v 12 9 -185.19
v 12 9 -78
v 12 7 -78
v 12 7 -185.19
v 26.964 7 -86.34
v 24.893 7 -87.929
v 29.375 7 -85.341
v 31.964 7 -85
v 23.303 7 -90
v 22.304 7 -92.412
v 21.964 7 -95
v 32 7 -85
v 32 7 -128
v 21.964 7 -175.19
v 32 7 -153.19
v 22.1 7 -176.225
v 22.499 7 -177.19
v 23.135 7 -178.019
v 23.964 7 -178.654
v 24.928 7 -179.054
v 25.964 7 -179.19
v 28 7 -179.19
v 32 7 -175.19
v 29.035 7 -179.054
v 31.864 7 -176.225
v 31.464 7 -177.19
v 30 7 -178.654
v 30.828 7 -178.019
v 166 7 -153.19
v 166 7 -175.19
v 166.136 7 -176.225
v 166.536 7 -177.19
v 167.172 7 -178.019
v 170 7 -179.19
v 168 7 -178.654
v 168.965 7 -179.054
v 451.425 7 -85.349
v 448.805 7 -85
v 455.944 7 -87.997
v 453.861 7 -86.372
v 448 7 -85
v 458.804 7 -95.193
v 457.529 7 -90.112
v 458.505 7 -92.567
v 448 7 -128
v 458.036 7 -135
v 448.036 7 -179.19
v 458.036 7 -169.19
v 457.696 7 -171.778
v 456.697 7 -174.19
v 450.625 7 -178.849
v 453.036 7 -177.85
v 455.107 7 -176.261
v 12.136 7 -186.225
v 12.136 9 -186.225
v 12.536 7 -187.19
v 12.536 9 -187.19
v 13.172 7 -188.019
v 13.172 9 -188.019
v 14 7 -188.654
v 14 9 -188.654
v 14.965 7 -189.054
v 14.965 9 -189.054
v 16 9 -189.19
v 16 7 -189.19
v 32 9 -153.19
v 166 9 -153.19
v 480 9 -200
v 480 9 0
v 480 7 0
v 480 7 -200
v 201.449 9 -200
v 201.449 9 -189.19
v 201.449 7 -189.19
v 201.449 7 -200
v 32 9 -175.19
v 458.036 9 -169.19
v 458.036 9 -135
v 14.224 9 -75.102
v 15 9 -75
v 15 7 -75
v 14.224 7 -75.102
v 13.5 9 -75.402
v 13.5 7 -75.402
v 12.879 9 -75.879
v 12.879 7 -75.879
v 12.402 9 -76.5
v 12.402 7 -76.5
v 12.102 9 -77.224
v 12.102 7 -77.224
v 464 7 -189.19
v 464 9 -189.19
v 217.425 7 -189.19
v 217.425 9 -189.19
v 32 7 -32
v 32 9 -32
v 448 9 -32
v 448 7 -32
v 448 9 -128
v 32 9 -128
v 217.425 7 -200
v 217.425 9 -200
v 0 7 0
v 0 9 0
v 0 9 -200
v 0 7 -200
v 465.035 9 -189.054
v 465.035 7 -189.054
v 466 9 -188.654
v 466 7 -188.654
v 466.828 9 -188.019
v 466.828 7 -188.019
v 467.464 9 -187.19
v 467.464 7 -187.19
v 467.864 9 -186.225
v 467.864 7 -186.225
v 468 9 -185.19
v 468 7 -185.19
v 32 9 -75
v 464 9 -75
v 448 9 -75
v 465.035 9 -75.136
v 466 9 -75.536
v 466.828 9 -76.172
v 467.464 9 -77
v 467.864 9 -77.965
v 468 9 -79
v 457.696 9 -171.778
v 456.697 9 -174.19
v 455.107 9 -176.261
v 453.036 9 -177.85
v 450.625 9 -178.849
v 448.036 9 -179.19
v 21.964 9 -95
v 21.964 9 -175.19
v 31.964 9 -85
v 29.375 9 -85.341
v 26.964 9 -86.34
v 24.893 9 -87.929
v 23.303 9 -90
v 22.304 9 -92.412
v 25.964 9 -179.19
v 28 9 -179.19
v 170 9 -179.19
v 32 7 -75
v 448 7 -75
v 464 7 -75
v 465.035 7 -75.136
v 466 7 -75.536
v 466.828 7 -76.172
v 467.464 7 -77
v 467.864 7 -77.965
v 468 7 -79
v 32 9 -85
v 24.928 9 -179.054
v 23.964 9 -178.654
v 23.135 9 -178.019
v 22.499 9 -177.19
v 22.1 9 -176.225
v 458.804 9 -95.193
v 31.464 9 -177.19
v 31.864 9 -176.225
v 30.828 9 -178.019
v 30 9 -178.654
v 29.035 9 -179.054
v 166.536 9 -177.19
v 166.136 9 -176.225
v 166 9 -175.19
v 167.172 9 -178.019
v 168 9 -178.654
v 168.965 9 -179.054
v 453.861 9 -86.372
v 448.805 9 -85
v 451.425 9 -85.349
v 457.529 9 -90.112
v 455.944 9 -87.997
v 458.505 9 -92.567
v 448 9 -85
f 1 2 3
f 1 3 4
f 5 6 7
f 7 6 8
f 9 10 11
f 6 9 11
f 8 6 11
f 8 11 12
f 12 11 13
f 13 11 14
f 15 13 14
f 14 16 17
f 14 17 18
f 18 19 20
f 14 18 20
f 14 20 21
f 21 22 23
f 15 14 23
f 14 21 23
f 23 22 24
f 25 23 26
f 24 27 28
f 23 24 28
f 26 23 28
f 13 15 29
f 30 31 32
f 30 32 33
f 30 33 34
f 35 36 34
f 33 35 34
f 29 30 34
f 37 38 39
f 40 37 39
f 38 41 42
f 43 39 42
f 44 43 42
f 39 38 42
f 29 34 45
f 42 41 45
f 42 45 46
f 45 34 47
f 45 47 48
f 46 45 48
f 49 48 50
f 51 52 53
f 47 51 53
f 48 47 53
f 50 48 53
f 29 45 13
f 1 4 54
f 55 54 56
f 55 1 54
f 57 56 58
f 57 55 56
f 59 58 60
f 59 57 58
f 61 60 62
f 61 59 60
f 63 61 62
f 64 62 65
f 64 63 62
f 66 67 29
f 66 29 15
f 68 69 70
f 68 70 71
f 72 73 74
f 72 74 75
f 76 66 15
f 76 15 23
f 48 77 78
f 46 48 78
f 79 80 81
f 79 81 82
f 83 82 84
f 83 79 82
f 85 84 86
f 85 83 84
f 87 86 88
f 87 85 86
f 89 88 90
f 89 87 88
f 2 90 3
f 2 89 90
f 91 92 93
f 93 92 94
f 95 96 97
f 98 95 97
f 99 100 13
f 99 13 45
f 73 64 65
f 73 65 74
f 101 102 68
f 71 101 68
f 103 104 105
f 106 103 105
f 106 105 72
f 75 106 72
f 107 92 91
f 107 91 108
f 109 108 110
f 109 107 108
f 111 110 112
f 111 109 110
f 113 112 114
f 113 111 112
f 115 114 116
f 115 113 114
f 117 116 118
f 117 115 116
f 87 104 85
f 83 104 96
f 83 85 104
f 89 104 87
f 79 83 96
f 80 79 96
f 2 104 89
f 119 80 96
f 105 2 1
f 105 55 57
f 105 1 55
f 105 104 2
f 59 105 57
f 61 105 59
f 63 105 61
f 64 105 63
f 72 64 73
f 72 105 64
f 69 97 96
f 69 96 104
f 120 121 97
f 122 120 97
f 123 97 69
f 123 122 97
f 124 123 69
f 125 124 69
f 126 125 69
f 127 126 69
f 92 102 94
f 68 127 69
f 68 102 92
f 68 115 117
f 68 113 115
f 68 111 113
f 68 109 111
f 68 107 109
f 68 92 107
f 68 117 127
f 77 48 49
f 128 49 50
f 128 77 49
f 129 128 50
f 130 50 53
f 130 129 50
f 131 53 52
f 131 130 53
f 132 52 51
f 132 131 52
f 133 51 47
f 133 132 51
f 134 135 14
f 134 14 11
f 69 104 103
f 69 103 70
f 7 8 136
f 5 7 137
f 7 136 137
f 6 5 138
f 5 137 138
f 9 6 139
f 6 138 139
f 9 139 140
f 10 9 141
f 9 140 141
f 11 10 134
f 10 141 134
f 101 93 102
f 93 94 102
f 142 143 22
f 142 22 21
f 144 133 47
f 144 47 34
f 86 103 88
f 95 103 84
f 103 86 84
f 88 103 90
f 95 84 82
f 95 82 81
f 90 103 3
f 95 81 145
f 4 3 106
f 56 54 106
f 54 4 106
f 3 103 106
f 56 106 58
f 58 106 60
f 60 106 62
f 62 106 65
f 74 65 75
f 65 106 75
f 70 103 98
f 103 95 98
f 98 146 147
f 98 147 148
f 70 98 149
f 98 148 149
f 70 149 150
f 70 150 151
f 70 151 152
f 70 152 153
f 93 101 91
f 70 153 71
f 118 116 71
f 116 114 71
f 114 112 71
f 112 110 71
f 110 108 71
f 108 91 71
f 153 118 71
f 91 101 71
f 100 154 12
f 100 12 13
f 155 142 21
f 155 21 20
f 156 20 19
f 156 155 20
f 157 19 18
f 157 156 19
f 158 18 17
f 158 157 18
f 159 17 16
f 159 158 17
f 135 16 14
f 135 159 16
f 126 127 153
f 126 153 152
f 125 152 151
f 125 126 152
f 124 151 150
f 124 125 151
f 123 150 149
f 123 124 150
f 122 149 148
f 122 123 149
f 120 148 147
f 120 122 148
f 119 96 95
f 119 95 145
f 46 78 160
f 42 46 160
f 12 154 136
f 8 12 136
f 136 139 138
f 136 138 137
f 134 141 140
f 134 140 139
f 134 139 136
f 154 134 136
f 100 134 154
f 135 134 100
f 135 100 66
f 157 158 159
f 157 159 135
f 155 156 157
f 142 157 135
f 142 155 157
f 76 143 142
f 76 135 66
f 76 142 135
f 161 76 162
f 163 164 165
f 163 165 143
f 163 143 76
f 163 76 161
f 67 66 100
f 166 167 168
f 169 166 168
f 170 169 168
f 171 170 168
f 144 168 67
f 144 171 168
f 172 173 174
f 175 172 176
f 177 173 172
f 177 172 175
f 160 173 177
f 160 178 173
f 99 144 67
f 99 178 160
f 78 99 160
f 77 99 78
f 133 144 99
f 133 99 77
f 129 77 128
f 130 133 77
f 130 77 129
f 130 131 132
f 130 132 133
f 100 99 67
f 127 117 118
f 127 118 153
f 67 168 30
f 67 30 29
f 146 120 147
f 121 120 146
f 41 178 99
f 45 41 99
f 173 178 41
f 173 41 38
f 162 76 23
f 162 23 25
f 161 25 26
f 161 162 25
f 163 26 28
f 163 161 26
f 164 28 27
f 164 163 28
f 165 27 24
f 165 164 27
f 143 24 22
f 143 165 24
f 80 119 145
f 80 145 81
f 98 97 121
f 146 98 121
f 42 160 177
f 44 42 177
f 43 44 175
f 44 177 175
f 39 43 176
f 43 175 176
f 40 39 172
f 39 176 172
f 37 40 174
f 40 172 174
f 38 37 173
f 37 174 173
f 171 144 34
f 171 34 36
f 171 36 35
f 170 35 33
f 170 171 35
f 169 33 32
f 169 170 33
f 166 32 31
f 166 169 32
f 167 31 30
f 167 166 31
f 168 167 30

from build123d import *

# Parameters (mm, degrees)
CROQUIS1_W              = 486.2
CROQUIS1_H              = 206.2
CROQUIS1_W_2            = 480
CROQUIS1_H_2            = 200
SALIENTE_EXTRUIR1_DEPTH = 12
CROQUIS3_W              = 486.2
CROQUIS3_H              = 206.2
CROQUIS3_W_2            = 480
CROQUIS3_H_2            = 200
CORTAR_EXTRUIR1_DEPTH   = 5
CORTAR_EXTRUIR3_DEPTH   = 8
CROQUIS4_W              = 20
CROQUIS4_H              = 6
CORTAR_EXTRUIR4_DEPTH   = 3
CORTAR_EXTRUIR5_DEPTH   = 2
CROQUIS7_W              = 721.947089947
CROQUIS7_H              = 359.419856831
CORTAR_EXTRUIR6_DEPTH   = 10
CROQUIS8_W              = 416
CROQUIS8_H              = 96
CORTAR_EXTRUIR7_DEPTH   = 10
CROQUIS9_W              = 531.904745737
CROQUIS9_H              = 246.353411826
CORTAR_EXTRUIR9_DEPTH   = 10
CROQUIS10_W             = 531.904745737
CROQUIS10_H             = 246.353411826
CORTAR_EXTRUIR10_DEPTH  = 10


with BuildPart() as part:
    # Croquis1 → Saliente-Extruir1 (new body)
    with BuildSketch(Plane(origin=(0, 0, 0), x_dir=(1, 0, 0), z_dir=(0, 1, 0))):
        with Locations((240, 100)):
            Rectangle(CROQUIS1_W, CROQUIS1_H)
        with Locations((240, 100)):
            Rectangle(CROQUIS1_W_2, CROQUIS1_H_2, mode=Mode.SUBTRACT)
        with Locations((240, 100)):
            Rectangle(CROQUIS1_W_2, CROQUIS1_H_2)
    extrude(amount=SALIENTE_EXTRUIR1_DEPTH)

    # Croquis3 → Cortar-Extruir1 (cut)
    with BuildSketch(Plane(origin=(0, 12, 0), x_dir=(1, 0, 0), z_dir=(0, 1, 0))):
        with Locations((240, 100)):
            Rectangle(CROQUIS3_W, CROQUIS3_H)
        with Locations((240, 100)):
            Rectangle(CROQUIS3_W_2, CROQUIS3_H_2, mode=Mode.SUBTRACT)
    extrude(amount=-CORTAR_EXTRUIR1_DEPTH, mode=Mode.SUBTRACT)

    # Croquis2 → Cortar-Extruir3 (cut)
    with BuildSketch(Plane(origin=(0, 12, 0), x_dir=(1, 0, 0), z_dir=(0, 1, 0))):
        with BuildLine():
            ThreePointArc((16, 189.1902066), (13.171572875, 188.018633725), (12, 185.1902066))
            Line((12, 185.1902066), (12, 78))
            ThreePointArc((12, 78), (12.878679656, 75.878679656), (15, 75))
            Line((15, 75), (32, 75))
            Line((32, 75), (32, 32))
            Line((32, 32), (448, 32))
            Line((448, 32), (448, 75))
            Line((448, 75), (464, 75))
            ThreePointArc((464, 75), (466.828427125, 76.171572875), (468, 79))
            Line((468, 79), (468, 185.1902066))
            ThreePointArc((468, 185.1902066), (466.828427125, 188.018633725), (464, 189.1902066))
            Line((464, 189.1902066), (217.424703227, 189.1902066))
            Line((217.424703227, 189.1902066), (217.424703227, 203.1))
            Line((217.424703227, 203.1), (201.44869327, 203.1))
            Line((201.44869327, 203.1), (201.44869327, 189.1902066))
            Line((201.44869327, 189.1902066), (16, 189.1902066))
        make_face()
        with BuildLine():
            Line((32, 85), (31.963588191, 85))
            ThreePointArc((31.963588191, 85), (24.892520379, 87.928932188), (21.963588191, 95))
            Line((21.963588191, 95), (21.963588191, 175.1902066))
            ThreePointArc((21.963588191, 175.1902066), (23.135161066, 178.018633725), (25.963588191, 179.1902066))
            Line((25.963588191, 179.1902066), (28, 179.1902066))
            ThreePointArc((28, 179.1902066), (30.828427125, 178.018633725), (32, 175.1902066))
            Line((32, 175.1902066), (32, 153.1902066))
            Line((32, 153.1902066), (166, 153.1902066))
            Line((166, 153.1902066), (166, 175.1902066))
            ThreePointArc((166, 175.1902066), (167.171572875, 178.018633725), (170, 179.1902066))
            Line((170, 179.1902066), (448.036411809, 179.1902066))
            ThreePointArc((448.036411809, 179.1902066), (455.107479621, 176.261274412), (458.036411809, 169.1902066))
            Line((458.036411809, 169.1902066), (458.036411809, 135.000000034))
            Line((458.036411809, 135.000000034), (458.803569043, 95.19268186))
            ThreePointArc((458.803569043, 95.19268186), (455.944291637, 87.997386866), (448.80542553, 85))
            Line((448.80542553, 85), (448, 85))
            Line((448, 85), (448, 128))
            Line((448, 128), (32, 128))
            Line((32, 128), (32, 85))
        make_face(mode=Mode.SUBTRACT)
    extrude(amount=-CORTAR_EXTRUIR3_DEPTH, mode=Mode.SUBTRACT)

    # Croquis4 → Cortar-Extruir4 (cut)
    with BuildSketch(Plane(origin=(0, 12, 0), x_dir=(1, 0, 0), z_dir=(0, 1, 0))):
        with BuildLine():
            Line((31.963588191, 85), (32, 128))
            Line((32, 128), (32, 134))
            Line((32, 134), (32, 147.1902066))
            Line((32, 147.1902066), (32, 153.1902066))
            Line((32, 153.1902066), (32, 175.1902066))
            ThreePointArc((32, 175.1902066), (30.828427125, 178.018633725), (28, 179.1902066))
            Line((28, 179.1902066), (25.963588191, 179.1902066))
            ThreePointArc((25.963588191, 179.1902066), (23.135161066, 178.018633725), (21.963588191, 175.1902066))
            Line((21.963588191, 175.1902066), (21.963588191, 95))
            ThreePointArc((21.963588191, 95), (24.892520379, 87.928932188), (31.963588191, 85))
        make_face()
        with Locations((42, 131)):
            Rectangle(CROQUIS4_W, CROQUIS4_H)
        with Locations((42, 150.1902066)):
            Rectangle(CROQUIS4_W, CROQUIS4_H)
        with BuildLine():
            ThreePointArc((12, 78), (12.878679656, 75.878679656), (15, 75))
            Line((15, 75), (32, 75))
            Line((32, 75), (32, 69))
            Line((32, 69), (6, 69))
            Line((6, 69), (6, 80))
            Line((6, 80), (6, 195.1902066))
            Line((6, 195.1902066), (16, 195.1902066))
            Line((16, 195.1902066), (32, 195.1902066))
            Line((32, 195.1902066), (32, 189.1902066))
            Line((32, 189.1902066), (16, 189.1902066))
            ThreePointArc((16, 189.1902066), (13.171572875, 188.018633725), (12, 185.1902066))
            Line((12, 185.1902066), (12, 80))
            Line((12, 80), (12, 78))
        make_face()
        with Locations((42, 192.1902066)):
            Rectangle(CROQUIS4_W, CROQUIS4_H)
        with Locations((42, 29)):
            Rectangle(CROQUIS4_W, CROQUIS4_H)
        with Locations((156, 192.1902066)):
            Rectangle(CROQUIS4_W, CROQUIS4_H)
        with Locations((156, 150.1902066)):
            Rectangle(CROQUIS4_W, CROQUIS4_H)
        with BuildLine():
            Line((166, 147.1902066), (448, 147.1902066))
            Line((448, 147.1902066), (458.036411809, 147.1902066))
            Line((458.036411809, 147.1902066), (458.036411809, 169.1902066))
            ThreePointArc((458.036411809, 169.1902066), (455.107479621, 176.261274412), (448.036411809, 179.1902066))
            Line((448.036411809, 179.1902066), (170, 179.1902066))
            ThreePointArc((170, 179.1902066), (167.171572875, 178.018633725), (166, 175.1902066))
            Line((166, 175.1902066), (166, 153.1902066))
            Line((166, 153.1902066), (166, 147.1902066))
        make_face()
        with BuildLine():
            Line((458.036411809, 169.1902066), (458.036411809, 147.1902066))
            Line((458.036411809, 147.1902066), (474, 147.1902066))
            Line((474, 147.1902066), (474, 195.1902066))
            Line((474, 195.1902066), (166, 195.1902066))
            Line((166, 195.1902066), (166, 189.1902066))
            Line((166, 189.1902066), (166, 175.1902066))
            ThreePointArc((166, 175.1902066), (167.171572875, 178.018633725), (170, 179.1902066))
            Line((170, 179.1902066), (448.036411809, 179.1902066))
            ThreePointArc((448.036411809, 179.1902066), (455.107479621, 176.261274412), (458.036411809, 169.1902066))
        make_face()
        with BuildLine():
            Line((448.80542553, 85), (448, 85))
            Line((448, 85), (448, 69))
            Line((448, 69), (474, 69))
            Line((474, 69), (474, 147.1902066))
            Line((474, 147.1902066), (458.036411809, 147.1902066))
            Line((458.036411809, 147.1902066), (458.036411809, 135.000000034))
            Line((458.036411809, 135.000000034), (458.803569043, 95.19268186))
            ThreePointArc((458.803569043, 95.19268186), (455.944291637, 87.997386866), (448.80542553, 85))
        make_face()
        with Locations((438, 131)):
            Rectangle(CROQUIS4_W, CROQUIS4_H)
        with Locations((438, 29)):
            Rectangle(CROQUIS4_W, CROQUIS4_H)
        with BuildLine():
            Line((448, 134), (448, 128))
            Line((448, 128), (448, 85))
            Line((448, 85), (448.80542553, 85))
            ThreePointArc((448.80542553, 85), (455.944291637, 87.997386866), (458.803569043, 95.19268186))
            Line((458.803569043, 95.19268186), (458.036411809, 135.000000034))
            Line((458.036411809, 135.000000034), (458.036411809, 147.1902066))
            Line((458.036411809, 147.1902066), (448, 147.1902066))
            Line((448, 147.1902066), (448, 134))
        make_face()
    extrude(amount=-CORTAR_EXTRUIR4_DEPTH, mode=Mode.SUBTRACT)

    # Croquis5 → Cortar-Extruir5 (cut)
    with BuildSketch(Plane(origin=(0, 4, 0), x_dir=(1, 0, 0), z_dir=(0, 1, 0))):
        with BuildLine():
            Line((32.046028397, 84.926485337), (32, 75))
            Line((32, 75), (15, 75))
            ThreePointArc((15, 75), (12.878679656, 75.878679656), (12, 78))
            Line((12, 78), (12, 185.1902066))
            ThreePointArc((12, 185.1902066), (13.171572875, 188.018633725), (16, 189.1902066))
            Line((16, 189.1902066), (201.44869327, 189.1902066))
            Line((201.44869327, 189.1902066), (201.44869327, 203.1))
            Line((201.44869327, 203.1), (217.424703227, 203.1))
            Line((217.424703227, 203.1), (217.424703227, 189.1902066))
            Line((217.424703227, 189.1902066), (464, 189.1902066))
            ThreePointArc((464, 189.1902066), (466.828427125, 188.018633725), (468, 185.1902066))
            Line((468, 185.1902066), (468, 79))
            ThreePointArc((468, 79), (466.828427125, 76.171572875), (464, 75))
            Line((464, 75), (448, 75))
            Line((448, 75), (448, 85))
            Line((448, 85), (448.80542553, 85))
            ThreePointArc((448.80542553, 85), (455.917657262, 88.023512896), (458.803569043, 95.19268186))
            Line((458.803569043, 95.19268186), (458.036411809, 169.1902066))
            ThreePointArc((458.036411809, 169.1902066), (455.107479621, 176.261274412), (448.036411809, 179.1902066))
            Line((448.036411809, 179.1902066), (170, 179.1902066))
            ThreePointArc((170, 179.1902066), (167.171572875, 178.018633725), (166, 175.1902066))
            Line((166, 175.1902066), (166, 153.1902066))
            Line((166, 153.1902066), (32, 153.1902066))
            Line((32, 153.1902066), (32, 175.1902066))
            ThreePointArc((32, 175.1902066), (30.828427125, 178.018633725), (28, 179.1902066))
            Line((28, 179.1902066), (25.963588191, 179.1902066))
            ThreePointArc((25.963588191, 179.1902066), (23.135161066, 178.018633725), (21.963588191, 175.1902066))
            Line((21.963588191, 175.1902066), (21.963588191, 95))
            ThreePointArc((21.963588191, 95), (24.91720844, 87.873793117), (32.046028397, 84.926485337))
        make_face()
    extrude(amount=-CORTAR_EXTRUIR5_DEPTH, mode=Mode.SUBTRACT)

    # Croquis7 → Cortar-Extruir6 (cut)
    with BuildSketch(Plane(origin=(0, 2, 0), x_dir=(1, 0, 0), z_dir=(0, 1, 0))):
        with Locations((149.368191722, 161.470369199)):
            Rectangle(CROQUIS7_W, CROQUIS7_H)
    extrude(amount=-CORTAR_EXTRUIR6_DEPTH, mode=Mode.SUBTRACT)

    # Croquis8 → Cortar-Extruir7 (cut)
    with BuildSketch(Plane(origin=(0, 4, 0), x_dir=(1, 0, 0), z_dir=(0, 1, 0))):
        with Locations((240, 80)):
            Rectangle(CROQUIS8_W, CROQUIS8_H)
    extrude(amount=-CORTAR_EXTRUIR7_DEPTH, mode=Mode.SUBTRACT)


with BuildPart() as cortar_extruir7_piece_1:
    # of the separate pieces the step leaves, piece 1, a body of its own (cortar_extruir7_pieces)
    add(part.part.solids().sort_by_distance((483.1, 2, 3.1))[0])


with BuildPart() as cortar_extruir7_piece_2:
    # of the separate pieces the step leaves, piece 2, a body of its own (cortar_extruir7_pieces)
    add(part.part.solids().sort_by_distance((32, 2, -128))[0])


with BuildPart() as cortar_extruir9_tool:
    # Croquis9 → Cortar-Extruir9 (new body)
    with BuildSketch(Plane(origin=(0, 9, 0), x_dir=(1, 0, 0), z_dir=(0, 1, 0))):
        with Locations((247.004349215, 106.418772052)):
            Rectangle(CROQUIS9_W, CROQUIS9_H)
    extrude(amount=CORTAR_EXTRUIR9_DEPTH)


with BuildPart() as cortar_extruir7_piece_1_1:
    add(cortar_extruir7_piece_1.part)

    # Cortar-Extruir9: cut by cortar_extruir9_tool
    add(cortar_extruir9_tool.part, mode=Mode.SUBTRACT)


with BuildPart() as cortar_extruir7_piece_2_1:
    add(cortar_extruir7_piece_2.part)

    # Cortar-Extruir9: cut by cortar_extruir9_tool
    add(cortar_extruir9_tool.part, mode=Mode.SUBTRACT)


with BuildPart() as cortar_extruir10_tool:
    # Croquis10 → Cortar-Extruir10 (new body)
    with BuildSketch(Plane(origin=(0, 7, 0), x_dir=(1, 0, 0), z_dir=(0, 1, 0))):
        with Locations((247.004349215, 106.418772052)):
            Rectangle(CROQUIS10_W, CROQUIS10_H)
    extrude(amount=-CORTAR_EXTRUIR10_DEPTH)


with BuildPart() as cortar_extruir7_piece_1_2:
    add(cortar_extruir7_piece_1_1.part)

    # Cortar-Extruir10: cut by cortar_extruir10_tool
    add(cortar_extruir10_tool.part, mode=Mode.SUBTRACT)


with BuildPart() as cortar_extruir7_piece_2_2:
    add(cortar_extruir7_piece_2_1.part)

    # Cortar-Extruir10: cut by cortar_extruir10_tool
    add(cortar_extruir10_tool.part, mode=Mode.SUBTRACT)


solid = Compound([cortar_extruir7_piece_1_2.part, cortar_extruir7_piece_2_2.part])
